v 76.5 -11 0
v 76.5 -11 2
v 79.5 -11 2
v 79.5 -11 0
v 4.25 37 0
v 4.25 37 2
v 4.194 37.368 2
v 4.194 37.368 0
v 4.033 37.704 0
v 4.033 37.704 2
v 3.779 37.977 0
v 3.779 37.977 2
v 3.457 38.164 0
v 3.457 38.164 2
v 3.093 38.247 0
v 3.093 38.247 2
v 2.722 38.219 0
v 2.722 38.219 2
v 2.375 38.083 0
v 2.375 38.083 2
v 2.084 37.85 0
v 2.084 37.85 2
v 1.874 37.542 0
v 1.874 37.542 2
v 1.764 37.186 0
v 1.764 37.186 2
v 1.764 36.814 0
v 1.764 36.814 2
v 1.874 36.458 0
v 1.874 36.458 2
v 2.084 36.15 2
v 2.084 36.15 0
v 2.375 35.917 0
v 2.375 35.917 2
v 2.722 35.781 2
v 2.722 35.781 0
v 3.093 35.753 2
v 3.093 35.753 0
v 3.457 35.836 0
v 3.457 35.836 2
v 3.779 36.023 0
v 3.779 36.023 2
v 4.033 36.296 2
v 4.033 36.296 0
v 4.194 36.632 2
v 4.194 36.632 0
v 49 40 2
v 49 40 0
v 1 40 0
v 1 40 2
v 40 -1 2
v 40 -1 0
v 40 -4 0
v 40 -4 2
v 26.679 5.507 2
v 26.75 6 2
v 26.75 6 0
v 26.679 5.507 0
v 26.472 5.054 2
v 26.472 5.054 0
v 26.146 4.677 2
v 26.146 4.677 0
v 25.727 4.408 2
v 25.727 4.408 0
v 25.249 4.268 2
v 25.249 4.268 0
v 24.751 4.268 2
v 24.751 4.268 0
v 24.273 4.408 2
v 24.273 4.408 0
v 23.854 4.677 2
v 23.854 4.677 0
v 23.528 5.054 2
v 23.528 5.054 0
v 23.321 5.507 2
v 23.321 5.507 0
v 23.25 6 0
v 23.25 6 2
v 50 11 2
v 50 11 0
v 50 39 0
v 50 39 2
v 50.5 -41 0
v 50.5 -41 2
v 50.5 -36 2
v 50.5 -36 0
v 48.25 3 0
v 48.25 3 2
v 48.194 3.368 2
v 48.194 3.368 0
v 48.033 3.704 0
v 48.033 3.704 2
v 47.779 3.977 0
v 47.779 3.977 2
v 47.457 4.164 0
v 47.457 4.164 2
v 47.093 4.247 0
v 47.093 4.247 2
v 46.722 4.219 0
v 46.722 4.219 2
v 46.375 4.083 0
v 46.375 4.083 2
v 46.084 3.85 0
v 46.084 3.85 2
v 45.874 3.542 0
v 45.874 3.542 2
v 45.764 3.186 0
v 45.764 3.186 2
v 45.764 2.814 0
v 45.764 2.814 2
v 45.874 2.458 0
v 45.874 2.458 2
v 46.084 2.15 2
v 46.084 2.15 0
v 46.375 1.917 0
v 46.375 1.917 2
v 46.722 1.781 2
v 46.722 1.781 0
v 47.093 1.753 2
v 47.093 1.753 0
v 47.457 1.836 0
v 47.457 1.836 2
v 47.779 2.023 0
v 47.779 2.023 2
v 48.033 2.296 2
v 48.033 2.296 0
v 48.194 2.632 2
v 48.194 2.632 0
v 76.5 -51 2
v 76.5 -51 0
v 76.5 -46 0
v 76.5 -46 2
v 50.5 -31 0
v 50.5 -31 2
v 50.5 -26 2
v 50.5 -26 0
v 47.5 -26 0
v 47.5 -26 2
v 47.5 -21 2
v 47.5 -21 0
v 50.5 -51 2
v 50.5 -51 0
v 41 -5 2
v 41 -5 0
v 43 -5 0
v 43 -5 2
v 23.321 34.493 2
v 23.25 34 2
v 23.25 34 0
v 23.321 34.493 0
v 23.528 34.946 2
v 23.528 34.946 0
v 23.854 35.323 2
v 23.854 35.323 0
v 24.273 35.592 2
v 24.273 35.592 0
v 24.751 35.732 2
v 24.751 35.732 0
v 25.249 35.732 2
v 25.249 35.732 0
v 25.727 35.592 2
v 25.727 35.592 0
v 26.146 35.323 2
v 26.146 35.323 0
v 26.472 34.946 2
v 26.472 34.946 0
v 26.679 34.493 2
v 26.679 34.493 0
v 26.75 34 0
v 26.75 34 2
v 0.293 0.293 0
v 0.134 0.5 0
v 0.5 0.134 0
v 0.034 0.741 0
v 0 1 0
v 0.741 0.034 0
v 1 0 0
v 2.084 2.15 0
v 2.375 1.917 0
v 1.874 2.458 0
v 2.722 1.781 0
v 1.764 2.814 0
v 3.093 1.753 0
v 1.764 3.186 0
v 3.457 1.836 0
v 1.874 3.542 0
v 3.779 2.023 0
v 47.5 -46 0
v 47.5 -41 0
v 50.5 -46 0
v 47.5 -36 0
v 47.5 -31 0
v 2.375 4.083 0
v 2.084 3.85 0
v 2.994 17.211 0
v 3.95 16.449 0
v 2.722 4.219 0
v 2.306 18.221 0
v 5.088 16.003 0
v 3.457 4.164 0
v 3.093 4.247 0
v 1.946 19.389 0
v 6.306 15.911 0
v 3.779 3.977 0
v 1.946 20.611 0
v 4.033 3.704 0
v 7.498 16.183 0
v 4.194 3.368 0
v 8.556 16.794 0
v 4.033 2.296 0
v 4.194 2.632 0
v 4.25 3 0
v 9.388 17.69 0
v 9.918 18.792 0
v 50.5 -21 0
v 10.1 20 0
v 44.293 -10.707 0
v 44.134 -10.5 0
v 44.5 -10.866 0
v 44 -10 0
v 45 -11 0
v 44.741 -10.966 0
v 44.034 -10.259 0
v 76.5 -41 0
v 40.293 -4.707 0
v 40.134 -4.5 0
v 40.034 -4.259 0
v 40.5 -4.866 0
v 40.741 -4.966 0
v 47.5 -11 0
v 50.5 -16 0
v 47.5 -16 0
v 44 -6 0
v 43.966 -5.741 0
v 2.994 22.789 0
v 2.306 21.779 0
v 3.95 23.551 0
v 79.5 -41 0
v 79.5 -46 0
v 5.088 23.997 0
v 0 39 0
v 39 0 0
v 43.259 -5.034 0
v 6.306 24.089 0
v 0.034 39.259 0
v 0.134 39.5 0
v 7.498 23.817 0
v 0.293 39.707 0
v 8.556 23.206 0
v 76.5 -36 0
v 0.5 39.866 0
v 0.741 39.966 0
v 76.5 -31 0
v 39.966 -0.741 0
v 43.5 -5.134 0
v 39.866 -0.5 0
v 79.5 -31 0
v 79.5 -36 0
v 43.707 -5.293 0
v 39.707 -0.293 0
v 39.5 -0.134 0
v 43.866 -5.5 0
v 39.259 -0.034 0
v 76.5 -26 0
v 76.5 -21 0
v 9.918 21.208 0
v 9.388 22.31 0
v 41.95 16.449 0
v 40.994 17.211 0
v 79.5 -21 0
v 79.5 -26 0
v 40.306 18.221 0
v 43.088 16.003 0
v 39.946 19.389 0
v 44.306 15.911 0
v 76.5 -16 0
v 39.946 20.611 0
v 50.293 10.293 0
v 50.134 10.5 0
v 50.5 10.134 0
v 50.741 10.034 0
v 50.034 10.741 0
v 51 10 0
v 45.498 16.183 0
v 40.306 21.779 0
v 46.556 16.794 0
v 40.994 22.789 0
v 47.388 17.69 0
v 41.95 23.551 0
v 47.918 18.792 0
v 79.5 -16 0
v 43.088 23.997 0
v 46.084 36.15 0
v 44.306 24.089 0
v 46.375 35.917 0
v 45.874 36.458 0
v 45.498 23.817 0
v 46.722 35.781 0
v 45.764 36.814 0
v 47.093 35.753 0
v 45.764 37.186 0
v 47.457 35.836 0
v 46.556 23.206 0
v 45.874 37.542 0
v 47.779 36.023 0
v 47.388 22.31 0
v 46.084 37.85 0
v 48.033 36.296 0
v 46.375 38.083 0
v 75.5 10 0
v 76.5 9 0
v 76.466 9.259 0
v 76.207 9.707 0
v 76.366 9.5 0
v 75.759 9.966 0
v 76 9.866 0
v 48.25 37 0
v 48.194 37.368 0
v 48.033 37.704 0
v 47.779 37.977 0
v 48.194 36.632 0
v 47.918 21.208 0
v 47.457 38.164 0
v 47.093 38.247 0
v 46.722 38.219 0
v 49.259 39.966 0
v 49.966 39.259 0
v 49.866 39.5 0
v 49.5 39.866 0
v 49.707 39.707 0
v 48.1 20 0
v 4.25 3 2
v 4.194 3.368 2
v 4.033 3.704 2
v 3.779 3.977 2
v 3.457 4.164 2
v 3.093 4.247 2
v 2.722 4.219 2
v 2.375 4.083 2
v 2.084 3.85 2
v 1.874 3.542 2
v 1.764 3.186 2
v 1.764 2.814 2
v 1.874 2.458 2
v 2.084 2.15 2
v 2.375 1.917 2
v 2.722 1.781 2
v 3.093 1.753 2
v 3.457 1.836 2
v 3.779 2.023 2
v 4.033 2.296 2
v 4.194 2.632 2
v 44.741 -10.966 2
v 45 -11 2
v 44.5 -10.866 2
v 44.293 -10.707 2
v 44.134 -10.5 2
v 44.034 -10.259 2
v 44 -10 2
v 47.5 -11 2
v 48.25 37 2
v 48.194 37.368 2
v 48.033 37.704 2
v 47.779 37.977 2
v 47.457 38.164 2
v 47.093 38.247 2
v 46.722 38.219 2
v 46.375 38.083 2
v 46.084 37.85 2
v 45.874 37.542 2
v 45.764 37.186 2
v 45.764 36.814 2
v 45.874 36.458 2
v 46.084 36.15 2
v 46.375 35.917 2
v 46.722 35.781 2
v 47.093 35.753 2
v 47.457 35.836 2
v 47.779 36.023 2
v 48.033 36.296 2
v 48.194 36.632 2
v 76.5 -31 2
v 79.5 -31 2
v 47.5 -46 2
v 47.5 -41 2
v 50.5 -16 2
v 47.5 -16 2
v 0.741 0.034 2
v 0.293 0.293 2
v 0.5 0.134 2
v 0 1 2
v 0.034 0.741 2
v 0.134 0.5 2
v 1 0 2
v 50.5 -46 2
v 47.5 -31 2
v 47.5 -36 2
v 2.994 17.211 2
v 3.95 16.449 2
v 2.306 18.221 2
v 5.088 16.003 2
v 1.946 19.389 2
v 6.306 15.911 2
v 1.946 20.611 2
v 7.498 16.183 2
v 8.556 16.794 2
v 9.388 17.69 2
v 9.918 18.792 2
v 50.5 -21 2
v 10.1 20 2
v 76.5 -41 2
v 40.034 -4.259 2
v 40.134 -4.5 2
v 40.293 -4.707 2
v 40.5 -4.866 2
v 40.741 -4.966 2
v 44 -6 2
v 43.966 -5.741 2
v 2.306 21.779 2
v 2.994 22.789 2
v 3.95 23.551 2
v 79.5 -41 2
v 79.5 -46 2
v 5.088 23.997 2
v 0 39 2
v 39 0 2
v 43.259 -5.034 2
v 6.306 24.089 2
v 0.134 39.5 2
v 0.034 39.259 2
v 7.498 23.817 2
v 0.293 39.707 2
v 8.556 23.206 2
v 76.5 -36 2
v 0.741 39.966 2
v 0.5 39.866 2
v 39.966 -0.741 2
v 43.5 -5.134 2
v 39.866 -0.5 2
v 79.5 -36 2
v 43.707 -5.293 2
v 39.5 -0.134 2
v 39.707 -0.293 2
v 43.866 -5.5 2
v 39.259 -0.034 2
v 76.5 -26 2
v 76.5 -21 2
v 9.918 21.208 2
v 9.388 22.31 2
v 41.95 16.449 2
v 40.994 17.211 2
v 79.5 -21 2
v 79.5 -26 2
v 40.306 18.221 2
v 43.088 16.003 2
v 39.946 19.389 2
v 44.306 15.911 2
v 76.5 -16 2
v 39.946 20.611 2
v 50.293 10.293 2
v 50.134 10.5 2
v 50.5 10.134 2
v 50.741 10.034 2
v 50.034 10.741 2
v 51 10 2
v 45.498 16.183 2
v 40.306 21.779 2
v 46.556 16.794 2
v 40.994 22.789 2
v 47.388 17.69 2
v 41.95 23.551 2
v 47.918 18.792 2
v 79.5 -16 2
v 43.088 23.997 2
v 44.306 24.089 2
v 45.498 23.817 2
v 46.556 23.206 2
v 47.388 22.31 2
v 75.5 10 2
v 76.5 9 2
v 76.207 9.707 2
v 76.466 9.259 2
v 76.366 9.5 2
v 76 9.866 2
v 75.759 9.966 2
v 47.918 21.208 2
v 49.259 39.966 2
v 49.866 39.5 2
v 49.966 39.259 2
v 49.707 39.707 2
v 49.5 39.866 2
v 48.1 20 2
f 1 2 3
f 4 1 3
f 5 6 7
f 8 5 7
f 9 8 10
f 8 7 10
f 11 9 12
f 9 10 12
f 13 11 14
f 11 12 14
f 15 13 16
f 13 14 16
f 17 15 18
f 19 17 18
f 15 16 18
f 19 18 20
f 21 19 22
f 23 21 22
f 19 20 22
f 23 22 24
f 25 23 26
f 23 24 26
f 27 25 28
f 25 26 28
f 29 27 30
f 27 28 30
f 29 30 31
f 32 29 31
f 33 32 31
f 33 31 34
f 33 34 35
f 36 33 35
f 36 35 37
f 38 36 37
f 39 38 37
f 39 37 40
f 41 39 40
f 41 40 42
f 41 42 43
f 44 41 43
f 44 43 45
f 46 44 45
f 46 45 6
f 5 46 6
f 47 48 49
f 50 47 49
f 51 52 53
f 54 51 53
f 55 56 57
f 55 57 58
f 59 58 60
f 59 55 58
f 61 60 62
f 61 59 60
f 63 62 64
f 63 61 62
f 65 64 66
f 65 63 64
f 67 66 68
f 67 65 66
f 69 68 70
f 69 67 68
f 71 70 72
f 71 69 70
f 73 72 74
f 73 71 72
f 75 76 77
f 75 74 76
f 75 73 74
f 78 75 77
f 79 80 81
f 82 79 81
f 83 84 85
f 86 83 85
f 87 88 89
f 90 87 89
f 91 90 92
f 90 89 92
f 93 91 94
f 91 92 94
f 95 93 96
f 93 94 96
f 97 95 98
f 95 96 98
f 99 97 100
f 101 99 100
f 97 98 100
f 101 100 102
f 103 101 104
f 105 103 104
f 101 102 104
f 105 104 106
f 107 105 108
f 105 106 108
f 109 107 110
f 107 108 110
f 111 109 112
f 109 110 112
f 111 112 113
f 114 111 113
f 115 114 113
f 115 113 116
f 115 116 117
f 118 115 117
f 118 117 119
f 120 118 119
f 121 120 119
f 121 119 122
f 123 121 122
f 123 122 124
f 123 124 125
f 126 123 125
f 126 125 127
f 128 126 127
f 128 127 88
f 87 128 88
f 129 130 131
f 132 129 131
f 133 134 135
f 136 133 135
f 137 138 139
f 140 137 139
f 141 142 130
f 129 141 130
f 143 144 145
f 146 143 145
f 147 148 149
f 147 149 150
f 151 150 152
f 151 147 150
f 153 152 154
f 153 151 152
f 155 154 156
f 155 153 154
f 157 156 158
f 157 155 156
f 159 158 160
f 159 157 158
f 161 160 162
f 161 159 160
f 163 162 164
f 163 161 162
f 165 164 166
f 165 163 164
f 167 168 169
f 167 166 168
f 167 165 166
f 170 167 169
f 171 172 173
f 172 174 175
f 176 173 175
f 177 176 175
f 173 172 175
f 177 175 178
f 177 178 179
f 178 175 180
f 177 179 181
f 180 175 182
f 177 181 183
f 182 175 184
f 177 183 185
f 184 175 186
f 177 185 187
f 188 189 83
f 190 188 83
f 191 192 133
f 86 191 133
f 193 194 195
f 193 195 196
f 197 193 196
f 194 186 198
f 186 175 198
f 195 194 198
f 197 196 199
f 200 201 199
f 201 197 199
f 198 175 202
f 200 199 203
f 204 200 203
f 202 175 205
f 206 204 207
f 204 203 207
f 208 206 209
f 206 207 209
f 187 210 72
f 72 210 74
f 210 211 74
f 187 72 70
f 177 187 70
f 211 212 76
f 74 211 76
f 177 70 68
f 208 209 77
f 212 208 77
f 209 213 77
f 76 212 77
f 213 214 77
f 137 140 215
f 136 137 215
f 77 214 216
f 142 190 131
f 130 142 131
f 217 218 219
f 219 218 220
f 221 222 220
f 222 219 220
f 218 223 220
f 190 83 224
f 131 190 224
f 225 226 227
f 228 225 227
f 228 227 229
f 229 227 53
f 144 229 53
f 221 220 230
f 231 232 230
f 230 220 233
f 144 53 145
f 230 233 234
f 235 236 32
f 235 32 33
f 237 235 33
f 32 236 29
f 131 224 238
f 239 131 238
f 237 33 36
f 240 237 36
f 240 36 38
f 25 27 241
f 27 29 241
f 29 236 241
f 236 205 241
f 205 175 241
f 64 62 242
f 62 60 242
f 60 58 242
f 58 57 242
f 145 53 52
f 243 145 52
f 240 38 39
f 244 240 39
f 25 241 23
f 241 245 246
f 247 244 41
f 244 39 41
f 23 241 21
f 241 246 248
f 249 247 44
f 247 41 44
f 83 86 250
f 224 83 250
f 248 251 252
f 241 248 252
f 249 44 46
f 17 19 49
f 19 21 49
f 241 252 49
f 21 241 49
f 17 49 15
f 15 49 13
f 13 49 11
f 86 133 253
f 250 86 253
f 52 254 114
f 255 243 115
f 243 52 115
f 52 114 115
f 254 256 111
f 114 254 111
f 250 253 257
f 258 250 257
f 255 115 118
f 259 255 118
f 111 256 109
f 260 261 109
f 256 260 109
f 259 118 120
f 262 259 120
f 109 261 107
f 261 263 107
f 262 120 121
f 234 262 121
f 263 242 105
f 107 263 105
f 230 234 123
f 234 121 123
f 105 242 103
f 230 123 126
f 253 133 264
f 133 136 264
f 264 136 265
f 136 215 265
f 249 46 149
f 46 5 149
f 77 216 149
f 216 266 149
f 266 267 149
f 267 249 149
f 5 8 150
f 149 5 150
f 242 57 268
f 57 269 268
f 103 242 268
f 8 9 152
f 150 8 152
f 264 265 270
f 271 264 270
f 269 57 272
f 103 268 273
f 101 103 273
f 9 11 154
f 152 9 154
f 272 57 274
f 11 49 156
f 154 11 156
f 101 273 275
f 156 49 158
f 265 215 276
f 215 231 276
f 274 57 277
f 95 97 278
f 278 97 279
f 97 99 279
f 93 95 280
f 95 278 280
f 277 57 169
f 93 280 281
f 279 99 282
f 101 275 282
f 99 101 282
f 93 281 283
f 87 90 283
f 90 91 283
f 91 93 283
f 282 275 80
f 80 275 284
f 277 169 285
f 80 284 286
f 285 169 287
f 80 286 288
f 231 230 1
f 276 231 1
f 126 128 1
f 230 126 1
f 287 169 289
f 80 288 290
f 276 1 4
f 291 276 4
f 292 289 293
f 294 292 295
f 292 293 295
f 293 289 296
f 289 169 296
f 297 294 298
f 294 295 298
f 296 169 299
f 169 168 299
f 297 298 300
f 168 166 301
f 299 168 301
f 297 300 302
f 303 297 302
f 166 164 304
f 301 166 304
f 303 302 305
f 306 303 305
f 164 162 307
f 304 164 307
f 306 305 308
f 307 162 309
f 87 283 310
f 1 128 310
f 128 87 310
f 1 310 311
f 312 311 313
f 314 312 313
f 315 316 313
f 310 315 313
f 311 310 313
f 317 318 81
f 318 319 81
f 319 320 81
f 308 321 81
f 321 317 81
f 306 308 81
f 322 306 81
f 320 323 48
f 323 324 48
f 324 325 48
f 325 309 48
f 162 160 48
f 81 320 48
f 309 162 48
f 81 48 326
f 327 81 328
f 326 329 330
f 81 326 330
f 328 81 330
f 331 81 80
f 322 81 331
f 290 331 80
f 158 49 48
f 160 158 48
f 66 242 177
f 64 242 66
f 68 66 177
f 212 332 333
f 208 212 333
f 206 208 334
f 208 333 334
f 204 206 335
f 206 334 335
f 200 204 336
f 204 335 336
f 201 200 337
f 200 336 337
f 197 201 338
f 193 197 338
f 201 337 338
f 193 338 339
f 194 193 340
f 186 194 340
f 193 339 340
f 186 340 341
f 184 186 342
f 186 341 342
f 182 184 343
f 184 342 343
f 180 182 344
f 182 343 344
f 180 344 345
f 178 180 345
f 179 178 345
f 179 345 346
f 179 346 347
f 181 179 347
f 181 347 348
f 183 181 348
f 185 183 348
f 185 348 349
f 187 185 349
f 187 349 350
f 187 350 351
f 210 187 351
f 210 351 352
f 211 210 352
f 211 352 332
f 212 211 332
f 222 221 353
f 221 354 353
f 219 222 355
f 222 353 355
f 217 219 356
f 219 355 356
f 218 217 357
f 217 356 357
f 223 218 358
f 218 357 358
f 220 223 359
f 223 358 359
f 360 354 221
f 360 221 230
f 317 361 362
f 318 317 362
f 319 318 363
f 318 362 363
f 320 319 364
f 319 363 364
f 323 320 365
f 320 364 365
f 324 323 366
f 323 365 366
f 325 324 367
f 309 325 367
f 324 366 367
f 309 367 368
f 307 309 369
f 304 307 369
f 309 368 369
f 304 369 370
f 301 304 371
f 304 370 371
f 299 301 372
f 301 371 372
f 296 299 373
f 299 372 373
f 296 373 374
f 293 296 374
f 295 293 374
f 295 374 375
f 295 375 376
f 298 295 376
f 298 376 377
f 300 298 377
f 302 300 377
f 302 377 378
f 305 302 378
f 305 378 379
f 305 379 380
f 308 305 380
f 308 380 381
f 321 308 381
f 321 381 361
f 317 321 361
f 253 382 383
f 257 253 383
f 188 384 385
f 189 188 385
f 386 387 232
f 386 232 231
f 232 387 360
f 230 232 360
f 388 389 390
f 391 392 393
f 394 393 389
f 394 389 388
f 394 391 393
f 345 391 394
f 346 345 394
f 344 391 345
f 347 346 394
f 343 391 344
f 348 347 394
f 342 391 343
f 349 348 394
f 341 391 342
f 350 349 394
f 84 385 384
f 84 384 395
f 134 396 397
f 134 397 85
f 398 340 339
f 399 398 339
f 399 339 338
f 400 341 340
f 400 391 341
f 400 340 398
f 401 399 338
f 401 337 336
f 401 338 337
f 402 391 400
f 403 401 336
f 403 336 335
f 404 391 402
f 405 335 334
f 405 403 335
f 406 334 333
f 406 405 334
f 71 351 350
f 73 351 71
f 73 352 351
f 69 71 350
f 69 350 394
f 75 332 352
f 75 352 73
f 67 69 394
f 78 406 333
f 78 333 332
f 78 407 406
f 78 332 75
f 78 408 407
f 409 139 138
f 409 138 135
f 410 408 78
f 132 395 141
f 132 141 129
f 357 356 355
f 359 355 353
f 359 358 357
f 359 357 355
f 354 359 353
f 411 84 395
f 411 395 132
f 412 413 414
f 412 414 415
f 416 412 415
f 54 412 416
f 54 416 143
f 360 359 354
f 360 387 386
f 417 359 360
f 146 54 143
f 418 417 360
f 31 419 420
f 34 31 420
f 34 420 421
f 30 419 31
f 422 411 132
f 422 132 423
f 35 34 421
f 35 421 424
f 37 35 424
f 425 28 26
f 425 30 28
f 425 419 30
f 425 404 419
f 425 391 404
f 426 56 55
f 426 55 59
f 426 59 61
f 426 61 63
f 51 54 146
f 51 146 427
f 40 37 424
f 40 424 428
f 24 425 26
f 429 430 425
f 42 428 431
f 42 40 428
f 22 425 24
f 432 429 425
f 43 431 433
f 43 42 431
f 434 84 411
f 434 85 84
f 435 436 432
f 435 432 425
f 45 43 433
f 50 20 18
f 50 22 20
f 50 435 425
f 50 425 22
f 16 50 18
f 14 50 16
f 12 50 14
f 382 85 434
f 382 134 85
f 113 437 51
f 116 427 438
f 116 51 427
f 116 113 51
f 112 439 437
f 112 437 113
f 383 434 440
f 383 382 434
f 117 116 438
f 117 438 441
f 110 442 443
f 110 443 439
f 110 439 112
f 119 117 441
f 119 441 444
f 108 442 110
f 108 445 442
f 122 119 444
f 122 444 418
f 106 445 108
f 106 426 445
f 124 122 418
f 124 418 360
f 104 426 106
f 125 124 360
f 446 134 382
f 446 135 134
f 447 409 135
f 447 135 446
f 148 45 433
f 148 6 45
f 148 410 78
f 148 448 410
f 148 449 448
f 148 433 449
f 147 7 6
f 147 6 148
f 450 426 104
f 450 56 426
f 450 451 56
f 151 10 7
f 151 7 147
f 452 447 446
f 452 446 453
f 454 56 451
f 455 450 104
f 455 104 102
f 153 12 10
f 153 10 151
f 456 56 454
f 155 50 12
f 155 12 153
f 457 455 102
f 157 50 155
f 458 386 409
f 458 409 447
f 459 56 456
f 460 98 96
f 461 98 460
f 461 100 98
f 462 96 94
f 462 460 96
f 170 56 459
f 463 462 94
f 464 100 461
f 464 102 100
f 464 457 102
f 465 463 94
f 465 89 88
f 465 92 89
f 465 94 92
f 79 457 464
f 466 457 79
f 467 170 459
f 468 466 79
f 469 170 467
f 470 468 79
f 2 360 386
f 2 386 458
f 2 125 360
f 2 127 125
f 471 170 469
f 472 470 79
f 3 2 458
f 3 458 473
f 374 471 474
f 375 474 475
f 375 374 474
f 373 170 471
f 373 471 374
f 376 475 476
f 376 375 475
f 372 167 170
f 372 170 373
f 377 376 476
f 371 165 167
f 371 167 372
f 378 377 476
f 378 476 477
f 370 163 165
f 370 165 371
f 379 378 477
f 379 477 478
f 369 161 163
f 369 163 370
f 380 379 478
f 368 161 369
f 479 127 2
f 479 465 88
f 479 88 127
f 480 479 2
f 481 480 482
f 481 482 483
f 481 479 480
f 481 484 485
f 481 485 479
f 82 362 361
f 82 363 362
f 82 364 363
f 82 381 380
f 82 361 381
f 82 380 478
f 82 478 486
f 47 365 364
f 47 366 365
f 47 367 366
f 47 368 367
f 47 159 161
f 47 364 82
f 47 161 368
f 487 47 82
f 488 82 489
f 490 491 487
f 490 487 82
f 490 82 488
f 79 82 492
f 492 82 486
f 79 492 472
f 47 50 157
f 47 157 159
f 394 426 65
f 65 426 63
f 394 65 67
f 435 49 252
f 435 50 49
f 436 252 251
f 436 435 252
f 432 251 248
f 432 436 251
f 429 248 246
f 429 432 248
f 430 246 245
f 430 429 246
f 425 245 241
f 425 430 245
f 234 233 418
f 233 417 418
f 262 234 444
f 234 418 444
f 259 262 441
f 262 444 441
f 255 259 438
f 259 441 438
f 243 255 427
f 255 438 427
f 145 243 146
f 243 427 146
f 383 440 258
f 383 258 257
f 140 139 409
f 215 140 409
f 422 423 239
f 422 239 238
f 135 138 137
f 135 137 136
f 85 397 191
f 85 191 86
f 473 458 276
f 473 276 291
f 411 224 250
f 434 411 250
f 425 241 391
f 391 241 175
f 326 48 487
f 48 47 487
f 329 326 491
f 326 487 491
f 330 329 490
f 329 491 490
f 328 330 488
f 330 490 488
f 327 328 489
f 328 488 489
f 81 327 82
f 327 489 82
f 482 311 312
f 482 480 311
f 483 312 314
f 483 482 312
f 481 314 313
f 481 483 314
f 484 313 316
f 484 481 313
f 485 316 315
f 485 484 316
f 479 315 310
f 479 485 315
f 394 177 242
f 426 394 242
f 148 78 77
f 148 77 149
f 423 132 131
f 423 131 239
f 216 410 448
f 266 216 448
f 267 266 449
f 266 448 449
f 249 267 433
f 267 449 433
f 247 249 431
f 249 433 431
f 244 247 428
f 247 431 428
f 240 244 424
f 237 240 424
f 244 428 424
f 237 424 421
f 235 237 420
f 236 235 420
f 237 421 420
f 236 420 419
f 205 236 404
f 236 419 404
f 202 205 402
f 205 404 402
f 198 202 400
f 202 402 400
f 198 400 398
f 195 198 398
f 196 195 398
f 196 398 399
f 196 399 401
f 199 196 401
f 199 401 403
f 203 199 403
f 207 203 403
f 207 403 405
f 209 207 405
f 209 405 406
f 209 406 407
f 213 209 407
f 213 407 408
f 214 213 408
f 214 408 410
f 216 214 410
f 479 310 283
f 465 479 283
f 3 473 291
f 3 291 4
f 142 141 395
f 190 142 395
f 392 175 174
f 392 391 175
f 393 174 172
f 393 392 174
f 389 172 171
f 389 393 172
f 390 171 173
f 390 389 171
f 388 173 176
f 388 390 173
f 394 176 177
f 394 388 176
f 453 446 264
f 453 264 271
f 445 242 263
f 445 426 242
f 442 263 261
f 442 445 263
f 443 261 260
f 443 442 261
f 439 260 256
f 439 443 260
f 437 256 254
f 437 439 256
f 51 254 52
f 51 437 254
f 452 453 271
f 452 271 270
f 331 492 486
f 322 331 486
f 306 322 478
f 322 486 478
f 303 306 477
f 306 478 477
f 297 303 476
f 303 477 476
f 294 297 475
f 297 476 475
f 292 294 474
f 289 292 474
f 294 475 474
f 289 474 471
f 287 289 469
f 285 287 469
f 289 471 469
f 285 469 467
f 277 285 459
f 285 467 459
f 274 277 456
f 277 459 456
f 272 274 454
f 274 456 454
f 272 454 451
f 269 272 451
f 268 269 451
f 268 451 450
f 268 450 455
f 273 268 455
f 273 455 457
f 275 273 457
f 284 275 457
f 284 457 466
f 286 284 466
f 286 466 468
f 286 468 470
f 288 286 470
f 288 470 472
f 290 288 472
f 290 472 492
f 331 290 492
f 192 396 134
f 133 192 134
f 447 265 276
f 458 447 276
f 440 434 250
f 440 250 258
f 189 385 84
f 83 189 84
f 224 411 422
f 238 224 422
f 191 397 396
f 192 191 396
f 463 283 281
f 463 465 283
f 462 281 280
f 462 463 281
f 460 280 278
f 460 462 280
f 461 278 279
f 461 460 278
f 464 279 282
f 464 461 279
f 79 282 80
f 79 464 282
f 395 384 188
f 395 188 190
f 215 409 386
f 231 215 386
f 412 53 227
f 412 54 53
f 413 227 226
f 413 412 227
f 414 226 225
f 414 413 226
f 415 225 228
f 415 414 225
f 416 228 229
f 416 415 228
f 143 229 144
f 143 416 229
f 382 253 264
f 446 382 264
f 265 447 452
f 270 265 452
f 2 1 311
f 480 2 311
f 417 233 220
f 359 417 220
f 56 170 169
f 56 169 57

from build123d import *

# Parameters (mm, degrees)
PLATE_BODY_DEPTH     = 2
SKETCH2_R            = 4.1
SHAFT_BEARINGS_DEPTH = 3
SLOT_DEPTH           = 3
SKETCH5_R            = 1.25
BOLT_HOLES_DEPTH     = 3
SKETCH6_W            = 0.5
SKETCH6_H            = 40
CUT_EXTRUDE1_DEPTH   = 3
SKETCH8_W            = 3
SKETCH8_H            = 5
FINGER_JOINTS_DEPTH  = 2
F_1MM_FILLETS_R      = 1


with BuildPart() as part:
    # Sketch1 → plate_body (new body)
    with BuildSketch(Plane.XY):
        Polygon((0, 40), (0, 0), (40, 0), (40, -5), (44, -5), (44, -11), (50, -11), (50, -51), (76.5, -51), (76.5, 10), (50, 10), (50, 40), align=None)
    extrude(amount=PLATE_BODY_DEPTH)

    # Sketch2 → shaft_bearings (cut, through all)
    with BuildSketch(Plane.XY.offset(2)):
        with Locations((6, 20)):
            Circle(SKETCH2_R)
        with Locations((44, 20)):
            Circle(SKETCH2_R)
    extrude(amount=-SHAFT_BEARINGS_DEPTH, mode=Mode.SUBTRACT)

    # Sketch4 → slot (cut, through all)
    with BuildSketch(Plane.XY.offset(2)):
        with BuildLine():
            Line((26.75, 34), (26.75, 6))
            ThreePointArc((26.75, 6), (25, 4.25), (23.25, 6))
            Line((23.25, 6), (23.25, 34))
            ThreePointArc((23.25, 34), (25, 35.75), (26.75, 34))
        make_face()
    extrude(amount=-SLOT_DEPTH, mode=Mode.SUBTRACT)

    # Sketch5 → bolt_holes (cut, through all)
    with BuildSketch(Plane.XY.offset(2)):
        with Locations((3, 37)):
            Circle(SKETCH5_R)
        with Locations((47, 37)):
            Circle(SKETCH5_R)
        with Locations((3, 3)):
            Circle(SKETCH5_R)
        with Locations((47, 3)):
            Circle(SKETCH5_R)
    extrude(amount=-BOLT_HOLES_DEPTH, mode=Mode.SUBTRACT)

    # Sketch6 → Cut-Extrude1 (cut, through all)
    with BuildSketch(Plane.XY.offset(2)):
        with Locations((50.25, -31)):
            Rectangle(SKETCH6_W, SKETCH6_H)
    extrude(amount=-CUT_EXTRUDE1_DEPTH, mode=Mode.SUBTRACT)

    # Sketch8 → finger_joints (add)
    with BuildSketch(Plane.XY.offset(2)):
        with Locations((49, -33.5)):
            Rectangle(SKETCH8_W, SKETCH8_H)
        with Locations((49, -43.5)):
            Rectangle(SKETCH8_W, SKETCH8_H)
        with Locations((78, -43.5)):
            Rectangle(SKETCH8_W, SKETCH8_H)
        with Locations((78, -33.5)):
            Rectangle(SKETCH8_W, SKETCH8_H)
        with Locations((49, -13.5)):
            Rectangle(SKETCH8_W, SKETCH8_H)
        with Locations((49, -23.5)):
            Rectangle(SKETCH8_W, SKETCH8_H)
        with Locations((78, -23.5)):
            Rectangle(SKETCH8_W, SKETCH8_H)
        with Locations((78, -13.5)):
            Rectangle(SKETCH8_W, SKETCH8_H)
    extrude(amount=-FINGER_JOINTS_DEPTH)

    # 1mm_fillets
    f_1mm_fillets_edges = [part.edges().sort_by_distance(p)[0] for p in [
        (44, -11, 1),
        (44, -5, 1),
        (40, -5, 1),
        (40, 0, 1),
        (0, 0, 1),
        (0, 40, 1),
        (50, 40, 1),
        (50, 10, 1),
        (76.5, 10, 1),
    ]]
    fillet(f_1mm_fillets_edges, radius=F_1MM_FILLETS_R)


solid = part.part
